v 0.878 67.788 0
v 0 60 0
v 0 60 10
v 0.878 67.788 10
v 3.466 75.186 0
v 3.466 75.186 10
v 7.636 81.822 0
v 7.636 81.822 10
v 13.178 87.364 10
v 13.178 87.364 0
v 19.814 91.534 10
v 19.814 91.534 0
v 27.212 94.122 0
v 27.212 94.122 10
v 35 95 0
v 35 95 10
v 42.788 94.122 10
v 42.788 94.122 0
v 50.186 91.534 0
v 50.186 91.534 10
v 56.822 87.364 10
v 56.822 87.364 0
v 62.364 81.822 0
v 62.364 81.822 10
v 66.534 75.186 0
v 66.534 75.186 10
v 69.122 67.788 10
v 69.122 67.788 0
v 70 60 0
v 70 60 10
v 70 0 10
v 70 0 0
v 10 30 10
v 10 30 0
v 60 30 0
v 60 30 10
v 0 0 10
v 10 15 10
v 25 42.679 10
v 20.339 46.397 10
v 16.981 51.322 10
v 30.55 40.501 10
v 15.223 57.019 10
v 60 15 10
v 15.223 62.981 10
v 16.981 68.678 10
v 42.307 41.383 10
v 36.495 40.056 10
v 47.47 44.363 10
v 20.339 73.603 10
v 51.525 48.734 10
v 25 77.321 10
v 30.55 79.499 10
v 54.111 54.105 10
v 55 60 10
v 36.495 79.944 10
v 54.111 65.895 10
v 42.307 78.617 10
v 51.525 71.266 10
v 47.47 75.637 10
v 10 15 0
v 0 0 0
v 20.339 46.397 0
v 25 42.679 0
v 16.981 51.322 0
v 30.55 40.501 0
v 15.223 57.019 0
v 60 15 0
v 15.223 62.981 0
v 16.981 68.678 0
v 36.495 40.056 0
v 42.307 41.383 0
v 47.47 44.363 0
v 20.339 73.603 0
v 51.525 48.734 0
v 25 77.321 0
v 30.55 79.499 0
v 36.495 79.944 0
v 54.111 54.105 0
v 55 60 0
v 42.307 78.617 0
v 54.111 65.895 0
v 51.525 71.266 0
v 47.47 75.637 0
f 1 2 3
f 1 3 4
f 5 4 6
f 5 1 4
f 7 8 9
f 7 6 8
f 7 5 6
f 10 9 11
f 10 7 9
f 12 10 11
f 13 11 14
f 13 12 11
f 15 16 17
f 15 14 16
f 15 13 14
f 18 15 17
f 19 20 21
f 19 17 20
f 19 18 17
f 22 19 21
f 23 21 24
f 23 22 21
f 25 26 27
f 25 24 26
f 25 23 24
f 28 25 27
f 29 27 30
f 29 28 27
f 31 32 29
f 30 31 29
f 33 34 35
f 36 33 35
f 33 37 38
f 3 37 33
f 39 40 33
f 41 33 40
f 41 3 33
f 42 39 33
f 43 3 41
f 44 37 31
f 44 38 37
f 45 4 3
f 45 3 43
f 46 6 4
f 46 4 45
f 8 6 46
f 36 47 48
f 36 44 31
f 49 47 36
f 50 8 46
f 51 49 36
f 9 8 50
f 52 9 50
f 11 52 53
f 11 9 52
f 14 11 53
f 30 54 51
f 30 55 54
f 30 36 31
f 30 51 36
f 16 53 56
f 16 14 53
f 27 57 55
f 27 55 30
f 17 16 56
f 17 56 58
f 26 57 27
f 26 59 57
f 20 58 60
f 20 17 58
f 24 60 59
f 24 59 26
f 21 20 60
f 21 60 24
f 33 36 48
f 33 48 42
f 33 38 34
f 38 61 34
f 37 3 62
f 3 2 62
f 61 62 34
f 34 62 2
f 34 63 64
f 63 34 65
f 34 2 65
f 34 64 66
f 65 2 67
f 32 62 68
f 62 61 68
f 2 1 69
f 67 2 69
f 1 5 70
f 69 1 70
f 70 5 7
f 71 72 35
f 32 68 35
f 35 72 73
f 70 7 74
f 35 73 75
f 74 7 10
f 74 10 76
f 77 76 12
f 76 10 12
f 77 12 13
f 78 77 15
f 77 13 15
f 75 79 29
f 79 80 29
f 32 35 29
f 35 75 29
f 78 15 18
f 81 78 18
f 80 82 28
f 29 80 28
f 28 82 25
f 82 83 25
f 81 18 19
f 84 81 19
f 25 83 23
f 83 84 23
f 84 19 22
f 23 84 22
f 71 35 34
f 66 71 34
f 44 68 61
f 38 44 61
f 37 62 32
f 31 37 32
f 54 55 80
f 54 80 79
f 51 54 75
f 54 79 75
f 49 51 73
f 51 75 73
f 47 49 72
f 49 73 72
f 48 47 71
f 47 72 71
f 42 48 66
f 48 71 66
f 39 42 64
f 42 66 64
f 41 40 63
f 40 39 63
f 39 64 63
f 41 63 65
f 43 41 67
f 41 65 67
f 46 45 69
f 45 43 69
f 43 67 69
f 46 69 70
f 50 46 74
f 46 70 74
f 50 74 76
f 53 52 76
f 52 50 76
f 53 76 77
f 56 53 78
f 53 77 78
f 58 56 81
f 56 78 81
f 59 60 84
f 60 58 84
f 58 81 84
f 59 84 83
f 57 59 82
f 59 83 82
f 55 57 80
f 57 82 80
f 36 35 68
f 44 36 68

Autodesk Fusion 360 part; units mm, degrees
sketch "Sketch1" plane through (0, 0, 0) normal (0, 0, 1) x (1, 0, 0)
  line L0 (0, 0) -> (70, 0)
  line L1 (70, 0) -> (70, 60)
  line L2 (0, 60) -> (0, 0)
  arc A0 (70, 60) -> (0, 60) centre (35, 60) ccw
  circle A1 centre (35, 60) radius 20
  line L3 (10, 30) -> (60, 30)
  line L4 (60, 30) -> (60, 15)
  line L5 (60, 15) -> (10, 15)
  line L6 (10, 15) -> (10, 30)
  dimension "d1" = 70
  dimension "d2" = 60
  dimension "d3" = 40
  dimension "d4" = 50
  dimension "d5" = 15
  dimension "d6" = 10
  dimension "d7" = 15
extrude "Extrude1" add sketch "Sketch1" along normal blind 10
